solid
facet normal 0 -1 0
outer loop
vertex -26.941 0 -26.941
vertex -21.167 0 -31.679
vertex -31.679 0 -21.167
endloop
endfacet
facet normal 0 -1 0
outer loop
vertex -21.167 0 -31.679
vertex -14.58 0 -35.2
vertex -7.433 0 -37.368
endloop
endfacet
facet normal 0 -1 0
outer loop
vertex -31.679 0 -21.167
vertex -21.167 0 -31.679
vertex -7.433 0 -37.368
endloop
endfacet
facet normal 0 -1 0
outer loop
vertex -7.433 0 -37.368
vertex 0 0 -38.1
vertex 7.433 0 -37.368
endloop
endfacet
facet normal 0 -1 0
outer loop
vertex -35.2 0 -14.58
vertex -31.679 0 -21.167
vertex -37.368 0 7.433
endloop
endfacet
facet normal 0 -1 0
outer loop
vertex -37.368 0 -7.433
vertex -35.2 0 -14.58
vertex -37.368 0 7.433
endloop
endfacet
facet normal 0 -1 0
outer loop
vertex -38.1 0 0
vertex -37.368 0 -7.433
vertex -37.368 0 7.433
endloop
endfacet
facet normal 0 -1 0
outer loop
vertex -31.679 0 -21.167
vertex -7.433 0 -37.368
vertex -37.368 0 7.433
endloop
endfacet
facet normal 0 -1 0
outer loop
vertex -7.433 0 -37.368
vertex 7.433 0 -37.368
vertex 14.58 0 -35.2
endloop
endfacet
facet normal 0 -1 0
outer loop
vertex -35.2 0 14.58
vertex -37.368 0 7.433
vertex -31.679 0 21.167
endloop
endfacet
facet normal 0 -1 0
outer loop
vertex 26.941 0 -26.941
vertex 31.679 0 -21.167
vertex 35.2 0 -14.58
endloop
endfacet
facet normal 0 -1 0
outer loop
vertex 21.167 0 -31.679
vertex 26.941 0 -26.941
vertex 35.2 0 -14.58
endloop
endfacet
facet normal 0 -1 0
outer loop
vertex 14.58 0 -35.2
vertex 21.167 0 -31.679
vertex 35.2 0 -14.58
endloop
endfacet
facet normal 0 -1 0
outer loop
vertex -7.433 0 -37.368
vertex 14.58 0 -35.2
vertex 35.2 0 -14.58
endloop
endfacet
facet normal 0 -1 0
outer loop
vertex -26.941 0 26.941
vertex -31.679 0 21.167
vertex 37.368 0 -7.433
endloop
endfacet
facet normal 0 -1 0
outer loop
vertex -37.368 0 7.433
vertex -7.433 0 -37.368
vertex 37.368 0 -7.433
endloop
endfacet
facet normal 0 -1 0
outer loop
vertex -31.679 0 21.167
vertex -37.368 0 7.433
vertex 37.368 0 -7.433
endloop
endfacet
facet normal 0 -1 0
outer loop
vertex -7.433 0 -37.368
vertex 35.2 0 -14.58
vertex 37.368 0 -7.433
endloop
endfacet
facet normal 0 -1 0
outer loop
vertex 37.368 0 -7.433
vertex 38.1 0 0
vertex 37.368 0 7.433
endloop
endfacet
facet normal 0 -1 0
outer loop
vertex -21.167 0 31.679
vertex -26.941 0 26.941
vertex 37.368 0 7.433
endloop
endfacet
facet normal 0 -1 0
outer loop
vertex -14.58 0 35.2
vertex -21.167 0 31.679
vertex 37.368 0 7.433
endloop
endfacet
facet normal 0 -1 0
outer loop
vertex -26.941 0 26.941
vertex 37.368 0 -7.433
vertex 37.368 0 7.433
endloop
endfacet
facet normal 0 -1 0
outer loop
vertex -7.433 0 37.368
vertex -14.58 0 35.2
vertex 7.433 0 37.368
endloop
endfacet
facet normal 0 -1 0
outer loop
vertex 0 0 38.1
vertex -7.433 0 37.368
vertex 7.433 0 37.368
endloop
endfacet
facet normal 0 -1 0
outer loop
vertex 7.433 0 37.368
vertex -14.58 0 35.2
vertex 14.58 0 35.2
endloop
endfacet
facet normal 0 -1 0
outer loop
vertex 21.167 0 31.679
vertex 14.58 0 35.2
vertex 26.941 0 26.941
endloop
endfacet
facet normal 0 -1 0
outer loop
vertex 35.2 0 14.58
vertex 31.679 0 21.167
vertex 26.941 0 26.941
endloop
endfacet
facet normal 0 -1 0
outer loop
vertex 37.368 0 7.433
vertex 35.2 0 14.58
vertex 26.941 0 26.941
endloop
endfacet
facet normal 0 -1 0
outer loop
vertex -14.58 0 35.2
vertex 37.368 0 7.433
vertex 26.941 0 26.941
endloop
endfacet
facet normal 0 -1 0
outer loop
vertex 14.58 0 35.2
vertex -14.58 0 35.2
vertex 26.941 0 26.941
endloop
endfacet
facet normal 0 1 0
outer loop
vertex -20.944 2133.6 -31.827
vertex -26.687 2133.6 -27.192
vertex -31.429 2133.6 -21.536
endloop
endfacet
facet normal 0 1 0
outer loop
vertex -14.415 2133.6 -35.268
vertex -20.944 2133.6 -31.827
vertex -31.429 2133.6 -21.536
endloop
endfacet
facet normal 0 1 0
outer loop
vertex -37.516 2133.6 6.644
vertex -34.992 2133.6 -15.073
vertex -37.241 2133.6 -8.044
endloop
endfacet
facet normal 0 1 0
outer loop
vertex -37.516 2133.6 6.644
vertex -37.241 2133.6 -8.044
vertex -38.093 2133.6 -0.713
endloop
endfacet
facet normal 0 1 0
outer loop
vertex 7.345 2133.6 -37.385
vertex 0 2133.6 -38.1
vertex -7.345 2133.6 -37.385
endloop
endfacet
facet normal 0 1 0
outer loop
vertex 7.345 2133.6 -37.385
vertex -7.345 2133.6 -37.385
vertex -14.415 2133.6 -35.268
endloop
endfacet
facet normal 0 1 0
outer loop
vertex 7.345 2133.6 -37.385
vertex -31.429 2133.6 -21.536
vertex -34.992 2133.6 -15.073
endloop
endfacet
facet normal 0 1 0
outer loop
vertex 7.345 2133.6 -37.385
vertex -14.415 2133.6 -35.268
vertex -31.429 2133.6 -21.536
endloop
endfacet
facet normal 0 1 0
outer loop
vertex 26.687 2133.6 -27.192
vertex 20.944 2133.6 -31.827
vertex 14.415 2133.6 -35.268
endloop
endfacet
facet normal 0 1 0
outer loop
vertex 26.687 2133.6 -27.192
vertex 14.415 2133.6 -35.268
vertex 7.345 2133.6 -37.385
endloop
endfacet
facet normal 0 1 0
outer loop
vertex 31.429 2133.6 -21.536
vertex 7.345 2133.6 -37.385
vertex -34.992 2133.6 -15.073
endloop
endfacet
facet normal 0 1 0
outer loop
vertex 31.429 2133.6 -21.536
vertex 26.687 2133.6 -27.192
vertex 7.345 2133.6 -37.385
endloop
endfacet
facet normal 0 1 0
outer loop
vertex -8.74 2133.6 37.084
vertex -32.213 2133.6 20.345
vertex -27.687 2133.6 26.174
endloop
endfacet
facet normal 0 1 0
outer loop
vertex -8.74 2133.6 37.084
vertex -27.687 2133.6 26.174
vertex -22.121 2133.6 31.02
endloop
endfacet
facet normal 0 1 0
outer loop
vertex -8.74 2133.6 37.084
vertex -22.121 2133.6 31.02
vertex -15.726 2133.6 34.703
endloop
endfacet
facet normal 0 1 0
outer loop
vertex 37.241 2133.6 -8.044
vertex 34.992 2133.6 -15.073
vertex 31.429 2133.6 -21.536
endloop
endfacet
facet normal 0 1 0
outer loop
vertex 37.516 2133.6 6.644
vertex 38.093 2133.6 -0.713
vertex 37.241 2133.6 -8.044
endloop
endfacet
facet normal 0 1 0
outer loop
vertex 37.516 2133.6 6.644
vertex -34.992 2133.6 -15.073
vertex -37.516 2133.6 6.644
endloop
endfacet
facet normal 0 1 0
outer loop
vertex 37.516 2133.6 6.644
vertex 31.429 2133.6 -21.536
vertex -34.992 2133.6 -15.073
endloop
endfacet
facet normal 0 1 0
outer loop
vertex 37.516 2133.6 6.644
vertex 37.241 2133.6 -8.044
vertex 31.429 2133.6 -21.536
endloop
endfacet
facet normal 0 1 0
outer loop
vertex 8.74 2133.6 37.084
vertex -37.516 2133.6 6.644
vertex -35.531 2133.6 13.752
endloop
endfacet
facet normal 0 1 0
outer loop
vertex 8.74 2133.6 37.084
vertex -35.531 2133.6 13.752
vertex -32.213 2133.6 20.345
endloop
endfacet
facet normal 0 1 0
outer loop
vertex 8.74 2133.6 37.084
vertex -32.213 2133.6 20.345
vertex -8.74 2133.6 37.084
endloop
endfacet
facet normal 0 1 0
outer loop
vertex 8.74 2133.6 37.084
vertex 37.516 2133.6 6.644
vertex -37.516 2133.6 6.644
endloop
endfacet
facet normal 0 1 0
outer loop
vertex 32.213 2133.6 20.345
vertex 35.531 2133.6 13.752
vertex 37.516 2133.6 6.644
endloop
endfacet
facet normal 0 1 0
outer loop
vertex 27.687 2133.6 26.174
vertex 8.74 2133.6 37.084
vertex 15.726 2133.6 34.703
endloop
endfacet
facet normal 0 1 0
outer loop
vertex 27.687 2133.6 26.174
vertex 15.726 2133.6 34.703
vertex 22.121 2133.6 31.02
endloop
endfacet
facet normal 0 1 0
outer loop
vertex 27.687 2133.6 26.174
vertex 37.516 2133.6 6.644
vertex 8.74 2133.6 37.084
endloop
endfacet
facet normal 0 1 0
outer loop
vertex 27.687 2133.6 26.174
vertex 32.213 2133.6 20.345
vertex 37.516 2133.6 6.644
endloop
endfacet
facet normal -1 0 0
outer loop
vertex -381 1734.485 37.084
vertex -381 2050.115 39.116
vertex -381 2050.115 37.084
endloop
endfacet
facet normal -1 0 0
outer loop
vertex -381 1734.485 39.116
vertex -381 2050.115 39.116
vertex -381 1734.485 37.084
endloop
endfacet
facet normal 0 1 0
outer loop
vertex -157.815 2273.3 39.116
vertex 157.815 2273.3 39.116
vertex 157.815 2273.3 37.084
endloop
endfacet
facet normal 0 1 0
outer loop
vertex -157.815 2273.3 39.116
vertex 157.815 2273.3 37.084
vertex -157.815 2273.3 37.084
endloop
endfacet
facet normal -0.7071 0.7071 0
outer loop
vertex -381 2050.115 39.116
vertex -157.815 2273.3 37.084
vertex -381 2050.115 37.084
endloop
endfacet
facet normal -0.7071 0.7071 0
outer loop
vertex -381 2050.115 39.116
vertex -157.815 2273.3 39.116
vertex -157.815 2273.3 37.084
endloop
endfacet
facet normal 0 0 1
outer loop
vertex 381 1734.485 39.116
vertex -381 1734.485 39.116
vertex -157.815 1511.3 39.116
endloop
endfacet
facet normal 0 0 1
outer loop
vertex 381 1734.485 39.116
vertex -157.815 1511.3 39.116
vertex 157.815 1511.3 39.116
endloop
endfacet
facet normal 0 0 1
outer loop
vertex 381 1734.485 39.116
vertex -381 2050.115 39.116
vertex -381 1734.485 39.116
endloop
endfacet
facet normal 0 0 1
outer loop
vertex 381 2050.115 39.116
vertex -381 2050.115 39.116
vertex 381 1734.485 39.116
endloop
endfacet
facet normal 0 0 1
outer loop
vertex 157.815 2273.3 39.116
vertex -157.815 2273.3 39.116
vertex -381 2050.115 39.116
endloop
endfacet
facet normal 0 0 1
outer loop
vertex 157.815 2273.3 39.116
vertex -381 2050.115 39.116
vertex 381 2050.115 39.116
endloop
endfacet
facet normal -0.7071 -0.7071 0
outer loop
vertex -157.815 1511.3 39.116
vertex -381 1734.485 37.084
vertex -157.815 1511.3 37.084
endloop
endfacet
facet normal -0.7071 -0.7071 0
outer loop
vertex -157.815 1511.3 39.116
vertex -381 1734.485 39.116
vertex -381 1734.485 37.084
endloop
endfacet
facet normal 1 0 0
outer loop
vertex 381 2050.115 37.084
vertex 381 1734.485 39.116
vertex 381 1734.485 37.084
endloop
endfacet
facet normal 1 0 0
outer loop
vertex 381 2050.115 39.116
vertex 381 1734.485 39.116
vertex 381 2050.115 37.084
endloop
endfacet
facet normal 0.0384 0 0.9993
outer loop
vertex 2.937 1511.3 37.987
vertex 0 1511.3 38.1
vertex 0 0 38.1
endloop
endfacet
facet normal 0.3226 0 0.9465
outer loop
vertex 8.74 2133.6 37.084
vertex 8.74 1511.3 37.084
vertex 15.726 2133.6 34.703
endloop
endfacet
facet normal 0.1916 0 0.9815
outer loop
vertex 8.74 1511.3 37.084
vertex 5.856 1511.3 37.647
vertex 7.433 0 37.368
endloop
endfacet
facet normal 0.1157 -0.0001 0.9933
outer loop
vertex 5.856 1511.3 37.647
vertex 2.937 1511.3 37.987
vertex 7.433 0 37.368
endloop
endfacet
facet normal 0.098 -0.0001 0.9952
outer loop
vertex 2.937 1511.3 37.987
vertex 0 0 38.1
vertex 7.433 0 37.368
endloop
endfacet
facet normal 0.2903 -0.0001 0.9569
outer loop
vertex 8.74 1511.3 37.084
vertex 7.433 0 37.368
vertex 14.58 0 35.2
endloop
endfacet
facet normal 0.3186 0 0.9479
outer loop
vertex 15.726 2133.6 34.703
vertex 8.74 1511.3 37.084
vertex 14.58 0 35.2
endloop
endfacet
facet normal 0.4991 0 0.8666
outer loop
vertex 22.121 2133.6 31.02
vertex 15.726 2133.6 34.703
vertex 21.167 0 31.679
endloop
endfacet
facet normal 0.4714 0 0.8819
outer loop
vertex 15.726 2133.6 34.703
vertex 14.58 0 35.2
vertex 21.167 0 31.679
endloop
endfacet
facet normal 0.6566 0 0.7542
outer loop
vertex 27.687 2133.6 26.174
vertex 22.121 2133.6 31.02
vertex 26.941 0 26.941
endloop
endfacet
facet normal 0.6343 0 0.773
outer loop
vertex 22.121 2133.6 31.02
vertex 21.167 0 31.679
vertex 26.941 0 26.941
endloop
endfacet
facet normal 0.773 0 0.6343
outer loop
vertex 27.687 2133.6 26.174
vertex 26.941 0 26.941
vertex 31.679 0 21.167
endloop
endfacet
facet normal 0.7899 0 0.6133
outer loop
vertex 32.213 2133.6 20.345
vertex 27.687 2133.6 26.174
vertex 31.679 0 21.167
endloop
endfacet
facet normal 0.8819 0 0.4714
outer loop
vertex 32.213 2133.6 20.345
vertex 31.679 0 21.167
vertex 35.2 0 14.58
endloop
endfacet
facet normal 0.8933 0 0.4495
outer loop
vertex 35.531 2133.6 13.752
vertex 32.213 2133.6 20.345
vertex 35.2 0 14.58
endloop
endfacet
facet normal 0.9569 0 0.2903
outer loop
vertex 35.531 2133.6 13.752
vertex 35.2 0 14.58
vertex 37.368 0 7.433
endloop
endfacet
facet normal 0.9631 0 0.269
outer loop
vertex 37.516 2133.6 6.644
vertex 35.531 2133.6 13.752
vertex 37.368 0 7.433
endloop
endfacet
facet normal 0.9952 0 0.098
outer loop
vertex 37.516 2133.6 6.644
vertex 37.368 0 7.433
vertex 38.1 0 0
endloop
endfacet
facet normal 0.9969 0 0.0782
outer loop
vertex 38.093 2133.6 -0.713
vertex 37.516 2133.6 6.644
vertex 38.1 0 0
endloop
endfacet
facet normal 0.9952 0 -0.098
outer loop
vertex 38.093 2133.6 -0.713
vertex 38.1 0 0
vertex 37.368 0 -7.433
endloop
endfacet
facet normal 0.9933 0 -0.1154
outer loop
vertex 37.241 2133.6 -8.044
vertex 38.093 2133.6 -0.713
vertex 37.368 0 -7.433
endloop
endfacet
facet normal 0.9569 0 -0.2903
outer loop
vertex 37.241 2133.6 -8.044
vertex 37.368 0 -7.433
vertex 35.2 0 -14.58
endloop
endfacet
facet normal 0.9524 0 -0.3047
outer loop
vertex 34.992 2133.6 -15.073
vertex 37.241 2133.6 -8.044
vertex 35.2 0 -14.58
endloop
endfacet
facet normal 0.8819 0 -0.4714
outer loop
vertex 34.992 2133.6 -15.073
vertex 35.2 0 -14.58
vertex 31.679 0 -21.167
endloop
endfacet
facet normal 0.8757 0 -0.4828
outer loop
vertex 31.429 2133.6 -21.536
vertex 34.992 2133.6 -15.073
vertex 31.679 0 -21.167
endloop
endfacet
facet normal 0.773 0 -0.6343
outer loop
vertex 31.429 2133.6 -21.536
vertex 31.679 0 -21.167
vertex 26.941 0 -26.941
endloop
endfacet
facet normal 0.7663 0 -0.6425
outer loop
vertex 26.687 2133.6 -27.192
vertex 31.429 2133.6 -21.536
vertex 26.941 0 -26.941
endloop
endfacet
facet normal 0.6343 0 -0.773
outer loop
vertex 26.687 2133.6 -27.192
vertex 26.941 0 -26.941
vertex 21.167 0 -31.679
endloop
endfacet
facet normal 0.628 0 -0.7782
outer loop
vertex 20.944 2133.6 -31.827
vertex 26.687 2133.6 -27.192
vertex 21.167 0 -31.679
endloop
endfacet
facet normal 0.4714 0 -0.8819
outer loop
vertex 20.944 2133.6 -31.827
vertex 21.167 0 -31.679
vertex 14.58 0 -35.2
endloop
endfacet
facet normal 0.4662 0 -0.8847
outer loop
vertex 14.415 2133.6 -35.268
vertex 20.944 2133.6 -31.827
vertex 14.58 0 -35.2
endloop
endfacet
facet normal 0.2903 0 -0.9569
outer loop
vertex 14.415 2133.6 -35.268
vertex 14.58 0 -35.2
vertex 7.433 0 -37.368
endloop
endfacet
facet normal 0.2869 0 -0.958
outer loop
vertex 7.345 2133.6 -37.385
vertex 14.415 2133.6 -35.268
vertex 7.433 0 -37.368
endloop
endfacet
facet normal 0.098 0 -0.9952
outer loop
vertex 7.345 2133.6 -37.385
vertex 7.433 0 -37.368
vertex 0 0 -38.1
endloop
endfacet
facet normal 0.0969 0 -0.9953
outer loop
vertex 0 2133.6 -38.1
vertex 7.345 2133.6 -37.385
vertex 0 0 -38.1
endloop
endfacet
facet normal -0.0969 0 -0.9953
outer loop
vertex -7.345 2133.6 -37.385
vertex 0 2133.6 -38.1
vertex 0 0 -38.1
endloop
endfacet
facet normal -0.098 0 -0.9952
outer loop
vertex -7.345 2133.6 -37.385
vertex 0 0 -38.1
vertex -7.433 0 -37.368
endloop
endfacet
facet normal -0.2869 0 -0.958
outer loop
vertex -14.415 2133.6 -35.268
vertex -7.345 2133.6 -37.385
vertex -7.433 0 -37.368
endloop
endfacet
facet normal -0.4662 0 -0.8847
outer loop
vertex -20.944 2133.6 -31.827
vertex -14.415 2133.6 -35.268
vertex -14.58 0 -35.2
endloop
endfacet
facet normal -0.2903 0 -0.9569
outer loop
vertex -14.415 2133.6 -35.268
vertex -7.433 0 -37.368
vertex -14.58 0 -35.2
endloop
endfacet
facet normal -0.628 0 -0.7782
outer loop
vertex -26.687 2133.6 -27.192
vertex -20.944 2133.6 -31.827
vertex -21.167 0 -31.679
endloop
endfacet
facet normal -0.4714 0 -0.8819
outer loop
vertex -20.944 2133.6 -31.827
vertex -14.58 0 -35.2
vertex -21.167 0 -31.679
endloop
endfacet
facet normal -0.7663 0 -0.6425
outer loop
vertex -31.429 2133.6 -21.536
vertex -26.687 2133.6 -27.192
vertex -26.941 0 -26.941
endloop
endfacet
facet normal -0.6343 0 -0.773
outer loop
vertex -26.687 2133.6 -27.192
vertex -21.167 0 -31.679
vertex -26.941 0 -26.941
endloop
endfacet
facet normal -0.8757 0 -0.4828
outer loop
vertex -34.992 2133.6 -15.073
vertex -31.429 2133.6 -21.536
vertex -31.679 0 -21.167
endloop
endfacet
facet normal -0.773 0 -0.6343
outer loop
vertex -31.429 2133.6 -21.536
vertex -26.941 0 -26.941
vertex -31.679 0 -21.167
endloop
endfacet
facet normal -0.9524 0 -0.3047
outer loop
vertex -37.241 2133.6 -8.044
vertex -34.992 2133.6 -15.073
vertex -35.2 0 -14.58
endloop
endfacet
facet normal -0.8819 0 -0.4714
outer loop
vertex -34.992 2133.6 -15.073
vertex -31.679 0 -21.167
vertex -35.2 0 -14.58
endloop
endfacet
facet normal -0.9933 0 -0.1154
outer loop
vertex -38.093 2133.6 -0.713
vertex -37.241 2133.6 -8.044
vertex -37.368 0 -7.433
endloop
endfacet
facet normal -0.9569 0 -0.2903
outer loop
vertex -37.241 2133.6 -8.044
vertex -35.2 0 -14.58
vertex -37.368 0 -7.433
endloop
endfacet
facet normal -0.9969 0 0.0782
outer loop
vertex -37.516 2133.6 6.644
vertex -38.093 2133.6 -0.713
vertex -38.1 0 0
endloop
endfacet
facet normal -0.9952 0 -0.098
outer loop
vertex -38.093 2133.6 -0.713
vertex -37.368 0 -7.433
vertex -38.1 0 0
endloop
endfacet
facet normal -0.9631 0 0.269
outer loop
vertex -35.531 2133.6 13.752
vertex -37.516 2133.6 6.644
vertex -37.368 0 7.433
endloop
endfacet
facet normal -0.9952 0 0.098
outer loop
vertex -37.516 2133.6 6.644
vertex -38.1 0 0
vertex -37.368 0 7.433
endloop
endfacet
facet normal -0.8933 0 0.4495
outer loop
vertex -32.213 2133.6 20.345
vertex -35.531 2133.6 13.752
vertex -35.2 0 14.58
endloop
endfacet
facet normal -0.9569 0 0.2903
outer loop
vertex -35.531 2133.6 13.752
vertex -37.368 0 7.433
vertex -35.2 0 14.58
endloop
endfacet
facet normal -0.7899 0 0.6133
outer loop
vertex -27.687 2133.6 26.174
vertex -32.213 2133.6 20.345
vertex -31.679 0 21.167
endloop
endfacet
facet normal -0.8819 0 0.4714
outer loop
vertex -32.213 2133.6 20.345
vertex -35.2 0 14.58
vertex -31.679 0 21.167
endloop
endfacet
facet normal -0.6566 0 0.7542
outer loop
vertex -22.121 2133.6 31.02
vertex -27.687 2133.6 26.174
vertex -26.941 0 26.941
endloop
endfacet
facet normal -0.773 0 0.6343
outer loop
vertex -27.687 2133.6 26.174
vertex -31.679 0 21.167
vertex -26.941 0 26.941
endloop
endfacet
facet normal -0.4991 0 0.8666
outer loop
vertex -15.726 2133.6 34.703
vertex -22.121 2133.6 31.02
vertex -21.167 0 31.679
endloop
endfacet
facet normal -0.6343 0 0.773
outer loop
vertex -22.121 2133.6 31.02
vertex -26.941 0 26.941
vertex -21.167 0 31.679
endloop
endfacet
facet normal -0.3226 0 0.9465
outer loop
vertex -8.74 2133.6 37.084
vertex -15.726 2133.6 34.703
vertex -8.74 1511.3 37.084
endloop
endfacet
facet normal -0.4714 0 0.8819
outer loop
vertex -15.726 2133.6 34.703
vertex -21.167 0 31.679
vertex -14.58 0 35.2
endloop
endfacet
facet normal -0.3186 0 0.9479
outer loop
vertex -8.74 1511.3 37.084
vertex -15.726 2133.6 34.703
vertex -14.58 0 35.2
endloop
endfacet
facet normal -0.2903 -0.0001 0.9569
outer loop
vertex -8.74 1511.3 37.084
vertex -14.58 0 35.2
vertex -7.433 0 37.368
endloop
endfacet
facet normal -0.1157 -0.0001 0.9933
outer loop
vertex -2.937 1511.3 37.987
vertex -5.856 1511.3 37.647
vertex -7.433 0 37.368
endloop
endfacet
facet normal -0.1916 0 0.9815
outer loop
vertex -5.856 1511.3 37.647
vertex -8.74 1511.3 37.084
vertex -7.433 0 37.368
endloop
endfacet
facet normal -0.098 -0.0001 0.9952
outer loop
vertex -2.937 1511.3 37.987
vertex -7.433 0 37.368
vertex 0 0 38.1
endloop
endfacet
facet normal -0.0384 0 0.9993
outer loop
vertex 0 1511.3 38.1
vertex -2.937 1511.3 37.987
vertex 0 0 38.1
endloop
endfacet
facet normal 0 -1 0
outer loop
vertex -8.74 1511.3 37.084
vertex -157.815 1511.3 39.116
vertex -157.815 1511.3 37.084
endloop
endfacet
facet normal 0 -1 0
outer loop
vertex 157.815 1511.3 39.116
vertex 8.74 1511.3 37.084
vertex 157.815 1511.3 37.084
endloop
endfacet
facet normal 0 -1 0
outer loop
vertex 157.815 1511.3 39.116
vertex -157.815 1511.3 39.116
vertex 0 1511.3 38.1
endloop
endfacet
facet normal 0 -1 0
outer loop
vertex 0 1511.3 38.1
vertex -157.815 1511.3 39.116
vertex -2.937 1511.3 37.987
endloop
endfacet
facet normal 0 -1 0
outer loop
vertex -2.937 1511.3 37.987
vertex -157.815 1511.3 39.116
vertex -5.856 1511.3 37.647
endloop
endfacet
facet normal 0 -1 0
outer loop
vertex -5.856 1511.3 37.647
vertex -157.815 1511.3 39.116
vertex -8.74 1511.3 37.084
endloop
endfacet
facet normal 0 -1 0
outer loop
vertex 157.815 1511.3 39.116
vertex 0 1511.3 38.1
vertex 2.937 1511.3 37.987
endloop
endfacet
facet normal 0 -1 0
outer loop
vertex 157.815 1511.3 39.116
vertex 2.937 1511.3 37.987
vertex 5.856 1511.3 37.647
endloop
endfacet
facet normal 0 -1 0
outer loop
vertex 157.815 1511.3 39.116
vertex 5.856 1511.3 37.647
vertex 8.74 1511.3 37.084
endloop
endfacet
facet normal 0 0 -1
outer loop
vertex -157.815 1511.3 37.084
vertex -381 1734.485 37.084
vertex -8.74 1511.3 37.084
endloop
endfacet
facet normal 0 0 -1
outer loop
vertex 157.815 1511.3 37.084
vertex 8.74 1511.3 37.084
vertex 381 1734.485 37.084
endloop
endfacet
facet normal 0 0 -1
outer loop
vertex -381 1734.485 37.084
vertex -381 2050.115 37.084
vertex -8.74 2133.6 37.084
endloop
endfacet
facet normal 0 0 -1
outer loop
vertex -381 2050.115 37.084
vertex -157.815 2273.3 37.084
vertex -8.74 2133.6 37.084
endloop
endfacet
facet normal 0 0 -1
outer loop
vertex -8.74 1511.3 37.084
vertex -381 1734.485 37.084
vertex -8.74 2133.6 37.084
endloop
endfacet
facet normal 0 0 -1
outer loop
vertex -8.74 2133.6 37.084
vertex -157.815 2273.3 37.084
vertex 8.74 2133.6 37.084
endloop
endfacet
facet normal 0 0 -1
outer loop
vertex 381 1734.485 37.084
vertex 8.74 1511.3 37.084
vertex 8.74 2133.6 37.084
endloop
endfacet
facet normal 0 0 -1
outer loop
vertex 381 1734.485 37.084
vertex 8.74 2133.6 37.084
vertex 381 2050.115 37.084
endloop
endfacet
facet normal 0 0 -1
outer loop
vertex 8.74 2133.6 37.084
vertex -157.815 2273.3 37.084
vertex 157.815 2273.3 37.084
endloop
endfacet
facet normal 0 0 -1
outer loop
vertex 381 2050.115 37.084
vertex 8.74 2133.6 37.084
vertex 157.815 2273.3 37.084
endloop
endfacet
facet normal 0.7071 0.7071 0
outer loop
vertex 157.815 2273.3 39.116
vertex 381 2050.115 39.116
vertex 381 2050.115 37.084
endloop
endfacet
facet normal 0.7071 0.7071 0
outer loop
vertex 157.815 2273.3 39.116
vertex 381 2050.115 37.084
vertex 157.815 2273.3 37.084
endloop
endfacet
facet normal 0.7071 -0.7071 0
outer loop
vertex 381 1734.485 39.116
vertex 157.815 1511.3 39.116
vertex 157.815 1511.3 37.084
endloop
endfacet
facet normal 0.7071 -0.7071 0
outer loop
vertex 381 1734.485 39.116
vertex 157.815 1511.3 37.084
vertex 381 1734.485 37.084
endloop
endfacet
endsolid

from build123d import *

# Parameters (mm, degrees)
SKETCH3_R           = 38.1
BOSS_EXTRUDE1_DEPTH = 2133.6
BOSS_EXTRUDE2_START = 38.1
BOSS_EXTRUDE2_DEPTH = 1.016


with BuildPart() as part:
    # Sketch3 → Boss-Extrude1 (new body)
    with BuildSketch(Plane(origin=(0, 0, 0), x_dir=(1, 0, 0), z_dir=(0, 1, 0))):
        with Locations(Location((0, 0, 0), (0, 0, 270))):
            Circle(SKETCH3_R)
    extrude(amount=BOSS_EXTRUDE1_DEPTH)

    # Sketch5 → Boss-Extrude2 (add, symmetric)
    with BuildSketch(Plane.XY.offset(BOSS_EXTRUDE2_START)):
        Polygon((-381, 1734.484632736), (-157.815367264, 1511.3), (157.815367264, 1511.3), (381, 1734.484632736), (381, 2050.115367264), (157.815367264, 2273.3), (-157.815367264, 2273.3), (-381, 2050.115367264), align=None)
    extrude(amount=BOSS_EXTRUDE2_DEPTH, both=True)


solid = part.part
